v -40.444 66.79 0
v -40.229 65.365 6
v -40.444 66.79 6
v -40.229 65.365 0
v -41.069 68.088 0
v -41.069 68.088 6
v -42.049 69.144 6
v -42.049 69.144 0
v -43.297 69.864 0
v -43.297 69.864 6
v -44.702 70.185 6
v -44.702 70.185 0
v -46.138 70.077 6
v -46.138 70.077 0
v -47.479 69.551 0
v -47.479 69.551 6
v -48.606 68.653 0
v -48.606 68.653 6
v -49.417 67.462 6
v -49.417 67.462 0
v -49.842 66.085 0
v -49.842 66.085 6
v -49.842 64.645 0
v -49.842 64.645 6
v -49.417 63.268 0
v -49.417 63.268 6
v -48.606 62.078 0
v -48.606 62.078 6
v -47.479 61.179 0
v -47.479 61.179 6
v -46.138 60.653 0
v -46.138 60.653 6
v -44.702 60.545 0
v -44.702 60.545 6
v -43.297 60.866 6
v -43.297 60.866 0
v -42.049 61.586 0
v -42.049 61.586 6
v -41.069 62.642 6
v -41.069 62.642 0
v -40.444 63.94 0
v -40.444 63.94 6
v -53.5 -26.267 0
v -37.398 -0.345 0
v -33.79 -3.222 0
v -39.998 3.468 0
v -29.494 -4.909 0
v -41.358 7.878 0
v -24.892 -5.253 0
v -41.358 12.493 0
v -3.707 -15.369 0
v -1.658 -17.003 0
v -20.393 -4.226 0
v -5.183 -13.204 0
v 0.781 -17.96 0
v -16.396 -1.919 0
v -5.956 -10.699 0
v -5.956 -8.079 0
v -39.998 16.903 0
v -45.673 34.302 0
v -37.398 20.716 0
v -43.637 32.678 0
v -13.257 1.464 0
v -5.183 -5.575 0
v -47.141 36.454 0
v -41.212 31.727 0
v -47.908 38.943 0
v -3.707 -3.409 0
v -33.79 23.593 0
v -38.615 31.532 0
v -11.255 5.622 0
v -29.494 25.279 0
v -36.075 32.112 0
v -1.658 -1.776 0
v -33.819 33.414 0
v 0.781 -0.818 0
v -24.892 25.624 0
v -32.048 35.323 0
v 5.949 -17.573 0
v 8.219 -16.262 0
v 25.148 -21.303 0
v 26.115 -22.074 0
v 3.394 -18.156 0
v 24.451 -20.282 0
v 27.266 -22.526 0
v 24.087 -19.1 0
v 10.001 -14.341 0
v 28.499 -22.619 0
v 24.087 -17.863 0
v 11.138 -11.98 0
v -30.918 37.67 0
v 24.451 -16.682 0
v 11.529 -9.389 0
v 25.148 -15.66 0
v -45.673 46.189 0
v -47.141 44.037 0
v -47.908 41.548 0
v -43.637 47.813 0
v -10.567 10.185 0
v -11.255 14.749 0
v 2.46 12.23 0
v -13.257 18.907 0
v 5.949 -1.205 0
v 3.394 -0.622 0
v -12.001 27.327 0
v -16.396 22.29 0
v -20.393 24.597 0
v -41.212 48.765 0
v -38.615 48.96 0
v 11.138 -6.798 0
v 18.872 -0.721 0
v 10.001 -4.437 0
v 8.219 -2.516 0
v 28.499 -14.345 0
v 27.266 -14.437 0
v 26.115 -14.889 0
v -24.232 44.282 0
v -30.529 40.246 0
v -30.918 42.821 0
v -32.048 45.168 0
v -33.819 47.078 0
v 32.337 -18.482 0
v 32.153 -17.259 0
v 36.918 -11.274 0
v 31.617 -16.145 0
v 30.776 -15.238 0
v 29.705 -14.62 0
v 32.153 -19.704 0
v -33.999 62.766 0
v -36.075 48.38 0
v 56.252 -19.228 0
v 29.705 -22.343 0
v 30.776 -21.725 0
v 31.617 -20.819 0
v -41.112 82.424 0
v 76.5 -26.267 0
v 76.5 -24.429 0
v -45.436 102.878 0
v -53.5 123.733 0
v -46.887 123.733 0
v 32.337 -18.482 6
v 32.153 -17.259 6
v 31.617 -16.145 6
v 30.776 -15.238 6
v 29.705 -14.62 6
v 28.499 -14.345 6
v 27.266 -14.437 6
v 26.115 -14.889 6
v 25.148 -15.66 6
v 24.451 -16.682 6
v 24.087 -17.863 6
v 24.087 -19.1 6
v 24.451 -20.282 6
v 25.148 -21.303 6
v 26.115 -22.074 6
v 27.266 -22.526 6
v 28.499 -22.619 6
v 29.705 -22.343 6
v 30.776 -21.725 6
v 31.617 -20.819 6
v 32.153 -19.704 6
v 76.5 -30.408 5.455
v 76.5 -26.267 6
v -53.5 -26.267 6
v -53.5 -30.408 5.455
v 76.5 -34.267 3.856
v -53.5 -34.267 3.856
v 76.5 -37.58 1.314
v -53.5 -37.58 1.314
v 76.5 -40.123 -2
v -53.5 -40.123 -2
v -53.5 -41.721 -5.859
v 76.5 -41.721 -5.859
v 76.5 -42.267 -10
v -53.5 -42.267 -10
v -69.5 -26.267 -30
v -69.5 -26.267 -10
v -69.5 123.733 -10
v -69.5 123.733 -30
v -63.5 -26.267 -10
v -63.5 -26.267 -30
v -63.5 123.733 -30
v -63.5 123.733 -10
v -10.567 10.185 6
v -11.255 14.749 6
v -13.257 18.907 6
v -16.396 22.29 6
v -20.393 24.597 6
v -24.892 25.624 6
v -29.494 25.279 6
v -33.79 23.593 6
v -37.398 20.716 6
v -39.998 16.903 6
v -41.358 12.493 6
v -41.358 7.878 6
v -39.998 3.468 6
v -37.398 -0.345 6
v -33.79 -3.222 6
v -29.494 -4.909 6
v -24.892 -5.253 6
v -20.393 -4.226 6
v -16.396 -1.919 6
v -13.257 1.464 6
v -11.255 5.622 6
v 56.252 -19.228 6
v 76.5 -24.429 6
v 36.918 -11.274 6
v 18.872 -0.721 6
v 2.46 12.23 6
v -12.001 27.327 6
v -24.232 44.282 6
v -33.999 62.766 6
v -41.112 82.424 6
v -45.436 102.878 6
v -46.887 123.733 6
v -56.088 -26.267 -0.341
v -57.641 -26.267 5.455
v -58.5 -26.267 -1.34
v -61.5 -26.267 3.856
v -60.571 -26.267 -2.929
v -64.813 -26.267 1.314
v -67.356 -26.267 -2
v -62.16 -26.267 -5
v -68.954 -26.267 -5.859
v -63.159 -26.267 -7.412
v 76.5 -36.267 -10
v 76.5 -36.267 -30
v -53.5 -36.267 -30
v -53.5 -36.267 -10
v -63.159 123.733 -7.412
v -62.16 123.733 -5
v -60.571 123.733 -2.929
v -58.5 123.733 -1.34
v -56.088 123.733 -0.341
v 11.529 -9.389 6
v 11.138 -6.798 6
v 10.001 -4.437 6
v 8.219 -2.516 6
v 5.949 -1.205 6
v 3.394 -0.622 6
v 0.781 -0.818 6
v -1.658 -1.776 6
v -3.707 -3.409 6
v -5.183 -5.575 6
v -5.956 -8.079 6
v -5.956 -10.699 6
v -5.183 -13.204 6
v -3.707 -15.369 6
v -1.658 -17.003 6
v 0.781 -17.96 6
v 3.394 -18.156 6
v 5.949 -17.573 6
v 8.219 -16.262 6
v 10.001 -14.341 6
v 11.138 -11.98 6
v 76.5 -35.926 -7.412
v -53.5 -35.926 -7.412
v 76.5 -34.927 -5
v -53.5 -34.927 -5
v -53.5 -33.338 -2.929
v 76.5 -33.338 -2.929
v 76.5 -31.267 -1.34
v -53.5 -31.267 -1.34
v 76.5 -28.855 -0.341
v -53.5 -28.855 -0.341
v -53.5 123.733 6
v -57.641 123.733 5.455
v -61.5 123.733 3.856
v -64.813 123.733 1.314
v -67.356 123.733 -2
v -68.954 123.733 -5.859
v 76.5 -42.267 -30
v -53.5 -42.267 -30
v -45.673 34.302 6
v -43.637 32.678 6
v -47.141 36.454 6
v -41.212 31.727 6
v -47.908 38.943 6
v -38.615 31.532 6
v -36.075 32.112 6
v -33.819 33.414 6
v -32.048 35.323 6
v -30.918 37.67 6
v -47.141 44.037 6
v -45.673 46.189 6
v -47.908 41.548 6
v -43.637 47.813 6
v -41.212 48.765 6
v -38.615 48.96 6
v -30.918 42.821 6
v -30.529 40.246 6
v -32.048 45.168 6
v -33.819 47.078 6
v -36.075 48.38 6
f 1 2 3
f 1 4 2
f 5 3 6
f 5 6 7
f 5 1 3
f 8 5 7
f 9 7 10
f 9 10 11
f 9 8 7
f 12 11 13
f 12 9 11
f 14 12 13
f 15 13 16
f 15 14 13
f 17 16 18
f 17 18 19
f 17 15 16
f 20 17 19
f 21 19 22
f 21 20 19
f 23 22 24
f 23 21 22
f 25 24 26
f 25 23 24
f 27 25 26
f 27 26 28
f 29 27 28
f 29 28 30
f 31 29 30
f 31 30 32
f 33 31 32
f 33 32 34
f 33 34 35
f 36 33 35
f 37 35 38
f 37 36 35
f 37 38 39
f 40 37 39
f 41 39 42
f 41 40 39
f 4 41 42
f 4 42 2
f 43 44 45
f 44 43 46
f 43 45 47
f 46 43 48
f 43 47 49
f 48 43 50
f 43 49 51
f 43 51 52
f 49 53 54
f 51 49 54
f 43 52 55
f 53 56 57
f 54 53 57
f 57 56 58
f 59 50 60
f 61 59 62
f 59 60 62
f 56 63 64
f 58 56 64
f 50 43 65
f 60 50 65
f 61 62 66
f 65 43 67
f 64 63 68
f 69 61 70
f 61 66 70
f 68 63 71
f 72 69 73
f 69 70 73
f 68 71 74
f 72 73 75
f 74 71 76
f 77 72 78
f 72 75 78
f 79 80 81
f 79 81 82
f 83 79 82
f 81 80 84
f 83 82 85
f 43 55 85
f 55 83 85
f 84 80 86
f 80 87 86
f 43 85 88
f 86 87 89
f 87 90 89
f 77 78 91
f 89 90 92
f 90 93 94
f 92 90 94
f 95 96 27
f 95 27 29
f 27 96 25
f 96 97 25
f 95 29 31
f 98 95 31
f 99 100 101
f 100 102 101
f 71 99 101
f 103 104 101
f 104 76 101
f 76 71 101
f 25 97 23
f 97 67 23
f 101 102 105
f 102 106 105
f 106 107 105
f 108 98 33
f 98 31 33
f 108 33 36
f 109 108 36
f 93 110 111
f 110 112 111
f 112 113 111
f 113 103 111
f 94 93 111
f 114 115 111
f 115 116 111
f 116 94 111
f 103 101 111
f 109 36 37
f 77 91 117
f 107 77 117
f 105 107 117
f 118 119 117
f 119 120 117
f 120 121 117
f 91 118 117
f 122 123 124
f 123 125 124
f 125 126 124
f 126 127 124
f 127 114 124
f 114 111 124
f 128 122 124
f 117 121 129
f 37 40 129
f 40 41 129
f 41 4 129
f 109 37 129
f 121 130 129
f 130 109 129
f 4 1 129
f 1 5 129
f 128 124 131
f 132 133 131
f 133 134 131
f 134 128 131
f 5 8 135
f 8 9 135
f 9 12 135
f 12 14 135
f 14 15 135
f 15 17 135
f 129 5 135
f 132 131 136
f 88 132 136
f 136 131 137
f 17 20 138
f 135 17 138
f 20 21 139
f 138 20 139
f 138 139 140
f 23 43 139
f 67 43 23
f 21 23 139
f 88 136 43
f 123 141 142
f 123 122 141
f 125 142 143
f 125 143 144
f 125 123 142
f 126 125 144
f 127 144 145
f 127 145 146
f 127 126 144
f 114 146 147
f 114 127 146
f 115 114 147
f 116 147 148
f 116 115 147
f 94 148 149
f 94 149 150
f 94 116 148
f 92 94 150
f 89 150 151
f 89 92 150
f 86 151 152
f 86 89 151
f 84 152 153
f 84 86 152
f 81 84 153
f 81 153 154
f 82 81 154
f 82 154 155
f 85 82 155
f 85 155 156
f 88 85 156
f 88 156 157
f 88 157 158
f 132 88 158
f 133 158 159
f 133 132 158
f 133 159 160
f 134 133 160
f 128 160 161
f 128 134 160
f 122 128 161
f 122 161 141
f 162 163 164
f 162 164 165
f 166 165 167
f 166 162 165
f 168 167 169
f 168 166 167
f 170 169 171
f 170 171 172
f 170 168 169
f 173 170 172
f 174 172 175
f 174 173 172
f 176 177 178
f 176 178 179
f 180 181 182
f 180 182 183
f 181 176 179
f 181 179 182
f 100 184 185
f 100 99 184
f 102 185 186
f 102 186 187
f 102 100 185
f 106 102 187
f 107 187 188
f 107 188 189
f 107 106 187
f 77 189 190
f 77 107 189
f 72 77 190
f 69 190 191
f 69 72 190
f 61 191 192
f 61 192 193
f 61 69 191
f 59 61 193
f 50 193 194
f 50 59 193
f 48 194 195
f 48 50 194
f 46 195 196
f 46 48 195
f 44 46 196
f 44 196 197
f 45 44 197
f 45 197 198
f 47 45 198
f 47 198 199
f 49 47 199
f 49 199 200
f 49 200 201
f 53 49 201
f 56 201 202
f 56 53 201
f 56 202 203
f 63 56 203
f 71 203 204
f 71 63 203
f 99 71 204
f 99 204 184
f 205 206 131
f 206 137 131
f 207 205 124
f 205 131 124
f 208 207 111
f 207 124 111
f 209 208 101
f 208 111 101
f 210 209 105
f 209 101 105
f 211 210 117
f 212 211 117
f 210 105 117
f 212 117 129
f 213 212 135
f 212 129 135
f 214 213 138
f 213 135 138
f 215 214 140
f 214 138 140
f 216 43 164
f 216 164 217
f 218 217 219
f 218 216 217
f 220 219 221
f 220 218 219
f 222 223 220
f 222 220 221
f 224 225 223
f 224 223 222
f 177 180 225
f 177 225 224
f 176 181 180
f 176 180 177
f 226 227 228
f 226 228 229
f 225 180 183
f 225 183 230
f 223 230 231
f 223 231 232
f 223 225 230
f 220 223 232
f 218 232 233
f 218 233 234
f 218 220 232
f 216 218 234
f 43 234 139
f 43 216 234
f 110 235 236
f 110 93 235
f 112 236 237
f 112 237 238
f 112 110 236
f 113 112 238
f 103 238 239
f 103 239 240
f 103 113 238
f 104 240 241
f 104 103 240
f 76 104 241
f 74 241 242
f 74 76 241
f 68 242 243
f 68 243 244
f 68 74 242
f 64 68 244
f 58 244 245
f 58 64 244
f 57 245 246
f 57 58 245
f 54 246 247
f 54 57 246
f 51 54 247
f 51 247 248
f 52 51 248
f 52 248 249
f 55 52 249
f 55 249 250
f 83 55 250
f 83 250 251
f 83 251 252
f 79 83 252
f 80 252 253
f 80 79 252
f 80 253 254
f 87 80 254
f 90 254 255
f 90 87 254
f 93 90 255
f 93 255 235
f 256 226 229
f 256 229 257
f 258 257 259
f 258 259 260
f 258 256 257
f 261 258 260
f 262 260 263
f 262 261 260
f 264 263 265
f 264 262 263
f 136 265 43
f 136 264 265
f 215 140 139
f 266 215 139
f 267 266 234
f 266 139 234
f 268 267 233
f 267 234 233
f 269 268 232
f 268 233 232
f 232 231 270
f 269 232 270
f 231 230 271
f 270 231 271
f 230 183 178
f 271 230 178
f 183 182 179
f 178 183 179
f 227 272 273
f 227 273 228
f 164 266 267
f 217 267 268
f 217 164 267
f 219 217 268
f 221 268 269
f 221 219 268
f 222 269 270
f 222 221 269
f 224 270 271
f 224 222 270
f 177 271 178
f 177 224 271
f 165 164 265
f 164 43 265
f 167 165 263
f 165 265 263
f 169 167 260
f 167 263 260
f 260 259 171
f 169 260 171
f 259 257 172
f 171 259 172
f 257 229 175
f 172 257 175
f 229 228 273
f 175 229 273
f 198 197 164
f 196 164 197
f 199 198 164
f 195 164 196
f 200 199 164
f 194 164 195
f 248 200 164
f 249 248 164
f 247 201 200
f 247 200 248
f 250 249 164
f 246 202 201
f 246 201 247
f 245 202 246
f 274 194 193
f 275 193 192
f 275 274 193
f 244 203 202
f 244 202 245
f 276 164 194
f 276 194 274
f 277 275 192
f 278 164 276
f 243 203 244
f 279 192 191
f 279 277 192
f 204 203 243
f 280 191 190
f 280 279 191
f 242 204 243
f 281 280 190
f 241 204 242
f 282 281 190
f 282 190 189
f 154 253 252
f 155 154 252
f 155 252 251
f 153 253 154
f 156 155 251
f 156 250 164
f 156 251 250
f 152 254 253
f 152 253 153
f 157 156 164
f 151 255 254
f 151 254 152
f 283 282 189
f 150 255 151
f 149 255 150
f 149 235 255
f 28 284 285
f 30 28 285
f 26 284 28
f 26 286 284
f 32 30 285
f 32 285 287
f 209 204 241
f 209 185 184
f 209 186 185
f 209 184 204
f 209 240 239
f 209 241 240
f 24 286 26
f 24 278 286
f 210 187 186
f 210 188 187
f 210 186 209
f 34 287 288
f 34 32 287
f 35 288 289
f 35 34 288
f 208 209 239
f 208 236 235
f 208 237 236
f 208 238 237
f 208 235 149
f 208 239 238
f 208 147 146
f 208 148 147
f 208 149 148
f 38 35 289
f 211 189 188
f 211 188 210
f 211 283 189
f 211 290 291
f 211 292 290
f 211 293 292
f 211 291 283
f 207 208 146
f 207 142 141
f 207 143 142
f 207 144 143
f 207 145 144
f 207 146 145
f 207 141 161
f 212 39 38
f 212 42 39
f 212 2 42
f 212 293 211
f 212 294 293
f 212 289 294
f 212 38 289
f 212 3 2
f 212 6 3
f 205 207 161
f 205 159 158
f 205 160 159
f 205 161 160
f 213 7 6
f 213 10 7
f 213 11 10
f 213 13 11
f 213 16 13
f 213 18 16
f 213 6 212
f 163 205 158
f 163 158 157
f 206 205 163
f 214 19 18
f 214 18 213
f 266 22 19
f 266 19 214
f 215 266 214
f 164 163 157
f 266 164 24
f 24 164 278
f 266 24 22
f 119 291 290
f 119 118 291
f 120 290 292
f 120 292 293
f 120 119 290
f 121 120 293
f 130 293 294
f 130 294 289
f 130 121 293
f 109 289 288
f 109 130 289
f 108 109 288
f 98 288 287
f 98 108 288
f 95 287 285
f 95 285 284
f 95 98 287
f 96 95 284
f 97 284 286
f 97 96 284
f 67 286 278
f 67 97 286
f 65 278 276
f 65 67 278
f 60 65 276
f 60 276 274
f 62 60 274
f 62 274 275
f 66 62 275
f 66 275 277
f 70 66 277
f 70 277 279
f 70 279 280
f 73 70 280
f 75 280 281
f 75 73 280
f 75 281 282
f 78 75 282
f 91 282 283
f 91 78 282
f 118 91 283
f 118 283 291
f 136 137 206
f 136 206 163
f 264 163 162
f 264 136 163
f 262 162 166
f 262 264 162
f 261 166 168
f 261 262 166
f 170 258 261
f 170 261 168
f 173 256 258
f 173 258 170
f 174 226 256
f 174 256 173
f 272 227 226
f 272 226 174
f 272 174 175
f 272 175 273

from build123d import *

# Parameters (mm, degrees)
SALIENTE_EXTRUIR1_DEPTH       = 3
CROQUIS2_R                    = 4.148409518
CROQUIS2_R_2                  = 8.791376577
CROQUIS2_R_3                  = 15.481976199
CROQUIS2_R_4                  = 8.738232185
CROQUIS2_R_5                  = 4.833412798
CORTAR_EXTRUIR1_DEPTH         = 3
CONVERTIR_S_LIDO1_START       = 3
CONVERTIR_S_LIDO1_OUTLINE_R   = 15.481976199
CONVERTIR_S_LIDO1_OUTLINE_R_2 = 8.791376577
CONVERTIR_S_LIDO1_OUTLINE_R_3 = 8.738232185
CONVERTIR_S_LIDO1_OUTLINE_R_4 = 4.148409518
CONVERTIR_S_LIDO1_OUTLINE_R_5 = 4.833412798
CONVERTIR_S_LIDO1_DEPTH       = 3
BRIDA_DE_ARISTA1_DEPTH        = 130
BRIDA_DE_ARISTA2_DEPTH        = 150


# Read off the part's stored shape, not the designer's step: Convertir-Sólido1
# Sheet-metal steps are written as plain solids
with BuildPart() as part:
    # Croquis1 → Saliente-Extruir1 (new body)
    with BuildSketch(Plane.XY):
        with BuildLine():
            Line((-53.499641927, 123.733441258), (-53.499641927, -26.266558742))
            Line((-53.499641927, -26.266558742), (76.500358073, -26.266558742))
            Line((76.500358073, -26.266558742), (76.500358073, -24.4289598))
            ThreePointArc((76.500358073, -24.4289598), (-12.000669933, 27.327433669), (-46.886740562, 123.733441258))
            Line((-46.886740562, 123.733441258), (-53.499641927, 123.733441258))
        make_face()
    extrude(amount=SALIENTE_EXTRUIR1_DEPTH)

    # Croquis2 → Cortar-Extruir1 (cut)
    with BuildSketch(Plane.XY.offset(3)):
        with Locations((28.189071336, -18.481702035)):
            Circle(CROQUIS2_R)
        with Locations((2.737394478, -9.389080565)):
            Circle(CROQUIS2_R_2)
        with Locations((-26.049076551, 10.185293851)):
            Circle(CROQUIS2_R_3)
        with Locations((-39.267642342, 40.245791579)):
            Circle(CROQUIS2_R_4)
        with Locations((-45.062734708, 65.365084268)):
            Circle(CROQUIS2_R_5)
    extrude(amount=-CORTAR_EXTRUIR1_DEPTH, mode=Mode.SUBTRACT)

    # Convertir-Sólido1 outline → Convertir-Sólido1 (add)
    with BuildSketch(Plane.XY.offset(CONVERTIR_S_LIDO1_START)):
        with BuildLine():
            Line((-53.499641927, -26.266558742), (76.500358073, -26.266558742))
            Line((76.500358073, -26.266558742), (76.500358073, -24.4289598))
            ThreePointArc((76.500358073, -24.4289598), (-12.000669933, 27.327433669), (-46.886740562, 123.733441258))
            Line((-46.886740562, 123.733441258), (-53.499641927, 123.733441258))
            Line((-53.499641927, 123.733441258), (-53.499641927, -26.266558742))
        make_face()
        with Locations((-26.049076551, 10.185293851)):
            Circle(CONVERTIR_S_LIDO1_OUTLINE_R, mode=Mode.SUBTRACT)
        with Locations((2.737394478, -9.389080565)):
            Circle(CONVERTIR_S_LIDO1_OUTLINE_R_2, mode=Mode.SUBTRACT)
        with Locations((-39.267642342, 40.245791579)):
            Circle(CONVERTIR_S_LIDO1_OUTLINE_R_3, mode=Mode.SUBTRACT)
        with Locations((28.189071336, -18.481702035)):
            Circle(CONVERTIR_S_LIDO1_OUTLINE_R_4, mode=Mode.SUBTRACT)
        with Locations((-45.062734708, 65.365084268)):
            Circle(CONVERTIR_S_LIDO1_OUTLINE_R_5, mode=Mode.SUBTRACT)
    extrude(amount=CONVERTIR_S_LIDO1_DEPTH)

    # Brida de arista1 section (across the edge) → Brida de arista1 (add)
    with BuildSketch(Plane(origin=(76.500358073, -36.266558742, 0), x_dir=(0, 1, 0), z_dir=(-1, 0, 0))):
        with BuildLine():
            Line((-6, 10), (-6, 30))
            Line((-6, 30), (0, 30))
            Line((0, 30), (0, 10))
            ThreePointArc((0, 10), (2.928932188, 2.928932188), (10, 0))
            Line((10, 0), (10, -6))
            ThreePointArc((10, -6), (-1.313708499, -1.313708499), (-6, 10))
        make_face()
    extrude(amount=BRIDA_DE_ARISTA1_DEPTH)

    # Brida de arista2 section (across the edge) → Brida de arista2 (add)
    with BuildSketch(Plane(origin=(-63.499641927, -26.266558742, 0), x_dir=(1, 0, 0), z_dir=(0, 1, 0))):
        with BuildLine():
            Line((-6, 10), (-6, 30))
            Line((-6, 30), (0, 30))
            Line((0, 30), (0, 10))
            ThreePointArc((0, 10), (2.928932188, 2.928932188), (10, 0))
            Line((10, 0), (10, -6))
            ThreePointArc((10, -6), (-1.313708499, -1.313708499), (-6, 10))
        make_face()
    extrude(amount=BRIDA_DE_ARISTA2_DEPTH)


solid = part.part
